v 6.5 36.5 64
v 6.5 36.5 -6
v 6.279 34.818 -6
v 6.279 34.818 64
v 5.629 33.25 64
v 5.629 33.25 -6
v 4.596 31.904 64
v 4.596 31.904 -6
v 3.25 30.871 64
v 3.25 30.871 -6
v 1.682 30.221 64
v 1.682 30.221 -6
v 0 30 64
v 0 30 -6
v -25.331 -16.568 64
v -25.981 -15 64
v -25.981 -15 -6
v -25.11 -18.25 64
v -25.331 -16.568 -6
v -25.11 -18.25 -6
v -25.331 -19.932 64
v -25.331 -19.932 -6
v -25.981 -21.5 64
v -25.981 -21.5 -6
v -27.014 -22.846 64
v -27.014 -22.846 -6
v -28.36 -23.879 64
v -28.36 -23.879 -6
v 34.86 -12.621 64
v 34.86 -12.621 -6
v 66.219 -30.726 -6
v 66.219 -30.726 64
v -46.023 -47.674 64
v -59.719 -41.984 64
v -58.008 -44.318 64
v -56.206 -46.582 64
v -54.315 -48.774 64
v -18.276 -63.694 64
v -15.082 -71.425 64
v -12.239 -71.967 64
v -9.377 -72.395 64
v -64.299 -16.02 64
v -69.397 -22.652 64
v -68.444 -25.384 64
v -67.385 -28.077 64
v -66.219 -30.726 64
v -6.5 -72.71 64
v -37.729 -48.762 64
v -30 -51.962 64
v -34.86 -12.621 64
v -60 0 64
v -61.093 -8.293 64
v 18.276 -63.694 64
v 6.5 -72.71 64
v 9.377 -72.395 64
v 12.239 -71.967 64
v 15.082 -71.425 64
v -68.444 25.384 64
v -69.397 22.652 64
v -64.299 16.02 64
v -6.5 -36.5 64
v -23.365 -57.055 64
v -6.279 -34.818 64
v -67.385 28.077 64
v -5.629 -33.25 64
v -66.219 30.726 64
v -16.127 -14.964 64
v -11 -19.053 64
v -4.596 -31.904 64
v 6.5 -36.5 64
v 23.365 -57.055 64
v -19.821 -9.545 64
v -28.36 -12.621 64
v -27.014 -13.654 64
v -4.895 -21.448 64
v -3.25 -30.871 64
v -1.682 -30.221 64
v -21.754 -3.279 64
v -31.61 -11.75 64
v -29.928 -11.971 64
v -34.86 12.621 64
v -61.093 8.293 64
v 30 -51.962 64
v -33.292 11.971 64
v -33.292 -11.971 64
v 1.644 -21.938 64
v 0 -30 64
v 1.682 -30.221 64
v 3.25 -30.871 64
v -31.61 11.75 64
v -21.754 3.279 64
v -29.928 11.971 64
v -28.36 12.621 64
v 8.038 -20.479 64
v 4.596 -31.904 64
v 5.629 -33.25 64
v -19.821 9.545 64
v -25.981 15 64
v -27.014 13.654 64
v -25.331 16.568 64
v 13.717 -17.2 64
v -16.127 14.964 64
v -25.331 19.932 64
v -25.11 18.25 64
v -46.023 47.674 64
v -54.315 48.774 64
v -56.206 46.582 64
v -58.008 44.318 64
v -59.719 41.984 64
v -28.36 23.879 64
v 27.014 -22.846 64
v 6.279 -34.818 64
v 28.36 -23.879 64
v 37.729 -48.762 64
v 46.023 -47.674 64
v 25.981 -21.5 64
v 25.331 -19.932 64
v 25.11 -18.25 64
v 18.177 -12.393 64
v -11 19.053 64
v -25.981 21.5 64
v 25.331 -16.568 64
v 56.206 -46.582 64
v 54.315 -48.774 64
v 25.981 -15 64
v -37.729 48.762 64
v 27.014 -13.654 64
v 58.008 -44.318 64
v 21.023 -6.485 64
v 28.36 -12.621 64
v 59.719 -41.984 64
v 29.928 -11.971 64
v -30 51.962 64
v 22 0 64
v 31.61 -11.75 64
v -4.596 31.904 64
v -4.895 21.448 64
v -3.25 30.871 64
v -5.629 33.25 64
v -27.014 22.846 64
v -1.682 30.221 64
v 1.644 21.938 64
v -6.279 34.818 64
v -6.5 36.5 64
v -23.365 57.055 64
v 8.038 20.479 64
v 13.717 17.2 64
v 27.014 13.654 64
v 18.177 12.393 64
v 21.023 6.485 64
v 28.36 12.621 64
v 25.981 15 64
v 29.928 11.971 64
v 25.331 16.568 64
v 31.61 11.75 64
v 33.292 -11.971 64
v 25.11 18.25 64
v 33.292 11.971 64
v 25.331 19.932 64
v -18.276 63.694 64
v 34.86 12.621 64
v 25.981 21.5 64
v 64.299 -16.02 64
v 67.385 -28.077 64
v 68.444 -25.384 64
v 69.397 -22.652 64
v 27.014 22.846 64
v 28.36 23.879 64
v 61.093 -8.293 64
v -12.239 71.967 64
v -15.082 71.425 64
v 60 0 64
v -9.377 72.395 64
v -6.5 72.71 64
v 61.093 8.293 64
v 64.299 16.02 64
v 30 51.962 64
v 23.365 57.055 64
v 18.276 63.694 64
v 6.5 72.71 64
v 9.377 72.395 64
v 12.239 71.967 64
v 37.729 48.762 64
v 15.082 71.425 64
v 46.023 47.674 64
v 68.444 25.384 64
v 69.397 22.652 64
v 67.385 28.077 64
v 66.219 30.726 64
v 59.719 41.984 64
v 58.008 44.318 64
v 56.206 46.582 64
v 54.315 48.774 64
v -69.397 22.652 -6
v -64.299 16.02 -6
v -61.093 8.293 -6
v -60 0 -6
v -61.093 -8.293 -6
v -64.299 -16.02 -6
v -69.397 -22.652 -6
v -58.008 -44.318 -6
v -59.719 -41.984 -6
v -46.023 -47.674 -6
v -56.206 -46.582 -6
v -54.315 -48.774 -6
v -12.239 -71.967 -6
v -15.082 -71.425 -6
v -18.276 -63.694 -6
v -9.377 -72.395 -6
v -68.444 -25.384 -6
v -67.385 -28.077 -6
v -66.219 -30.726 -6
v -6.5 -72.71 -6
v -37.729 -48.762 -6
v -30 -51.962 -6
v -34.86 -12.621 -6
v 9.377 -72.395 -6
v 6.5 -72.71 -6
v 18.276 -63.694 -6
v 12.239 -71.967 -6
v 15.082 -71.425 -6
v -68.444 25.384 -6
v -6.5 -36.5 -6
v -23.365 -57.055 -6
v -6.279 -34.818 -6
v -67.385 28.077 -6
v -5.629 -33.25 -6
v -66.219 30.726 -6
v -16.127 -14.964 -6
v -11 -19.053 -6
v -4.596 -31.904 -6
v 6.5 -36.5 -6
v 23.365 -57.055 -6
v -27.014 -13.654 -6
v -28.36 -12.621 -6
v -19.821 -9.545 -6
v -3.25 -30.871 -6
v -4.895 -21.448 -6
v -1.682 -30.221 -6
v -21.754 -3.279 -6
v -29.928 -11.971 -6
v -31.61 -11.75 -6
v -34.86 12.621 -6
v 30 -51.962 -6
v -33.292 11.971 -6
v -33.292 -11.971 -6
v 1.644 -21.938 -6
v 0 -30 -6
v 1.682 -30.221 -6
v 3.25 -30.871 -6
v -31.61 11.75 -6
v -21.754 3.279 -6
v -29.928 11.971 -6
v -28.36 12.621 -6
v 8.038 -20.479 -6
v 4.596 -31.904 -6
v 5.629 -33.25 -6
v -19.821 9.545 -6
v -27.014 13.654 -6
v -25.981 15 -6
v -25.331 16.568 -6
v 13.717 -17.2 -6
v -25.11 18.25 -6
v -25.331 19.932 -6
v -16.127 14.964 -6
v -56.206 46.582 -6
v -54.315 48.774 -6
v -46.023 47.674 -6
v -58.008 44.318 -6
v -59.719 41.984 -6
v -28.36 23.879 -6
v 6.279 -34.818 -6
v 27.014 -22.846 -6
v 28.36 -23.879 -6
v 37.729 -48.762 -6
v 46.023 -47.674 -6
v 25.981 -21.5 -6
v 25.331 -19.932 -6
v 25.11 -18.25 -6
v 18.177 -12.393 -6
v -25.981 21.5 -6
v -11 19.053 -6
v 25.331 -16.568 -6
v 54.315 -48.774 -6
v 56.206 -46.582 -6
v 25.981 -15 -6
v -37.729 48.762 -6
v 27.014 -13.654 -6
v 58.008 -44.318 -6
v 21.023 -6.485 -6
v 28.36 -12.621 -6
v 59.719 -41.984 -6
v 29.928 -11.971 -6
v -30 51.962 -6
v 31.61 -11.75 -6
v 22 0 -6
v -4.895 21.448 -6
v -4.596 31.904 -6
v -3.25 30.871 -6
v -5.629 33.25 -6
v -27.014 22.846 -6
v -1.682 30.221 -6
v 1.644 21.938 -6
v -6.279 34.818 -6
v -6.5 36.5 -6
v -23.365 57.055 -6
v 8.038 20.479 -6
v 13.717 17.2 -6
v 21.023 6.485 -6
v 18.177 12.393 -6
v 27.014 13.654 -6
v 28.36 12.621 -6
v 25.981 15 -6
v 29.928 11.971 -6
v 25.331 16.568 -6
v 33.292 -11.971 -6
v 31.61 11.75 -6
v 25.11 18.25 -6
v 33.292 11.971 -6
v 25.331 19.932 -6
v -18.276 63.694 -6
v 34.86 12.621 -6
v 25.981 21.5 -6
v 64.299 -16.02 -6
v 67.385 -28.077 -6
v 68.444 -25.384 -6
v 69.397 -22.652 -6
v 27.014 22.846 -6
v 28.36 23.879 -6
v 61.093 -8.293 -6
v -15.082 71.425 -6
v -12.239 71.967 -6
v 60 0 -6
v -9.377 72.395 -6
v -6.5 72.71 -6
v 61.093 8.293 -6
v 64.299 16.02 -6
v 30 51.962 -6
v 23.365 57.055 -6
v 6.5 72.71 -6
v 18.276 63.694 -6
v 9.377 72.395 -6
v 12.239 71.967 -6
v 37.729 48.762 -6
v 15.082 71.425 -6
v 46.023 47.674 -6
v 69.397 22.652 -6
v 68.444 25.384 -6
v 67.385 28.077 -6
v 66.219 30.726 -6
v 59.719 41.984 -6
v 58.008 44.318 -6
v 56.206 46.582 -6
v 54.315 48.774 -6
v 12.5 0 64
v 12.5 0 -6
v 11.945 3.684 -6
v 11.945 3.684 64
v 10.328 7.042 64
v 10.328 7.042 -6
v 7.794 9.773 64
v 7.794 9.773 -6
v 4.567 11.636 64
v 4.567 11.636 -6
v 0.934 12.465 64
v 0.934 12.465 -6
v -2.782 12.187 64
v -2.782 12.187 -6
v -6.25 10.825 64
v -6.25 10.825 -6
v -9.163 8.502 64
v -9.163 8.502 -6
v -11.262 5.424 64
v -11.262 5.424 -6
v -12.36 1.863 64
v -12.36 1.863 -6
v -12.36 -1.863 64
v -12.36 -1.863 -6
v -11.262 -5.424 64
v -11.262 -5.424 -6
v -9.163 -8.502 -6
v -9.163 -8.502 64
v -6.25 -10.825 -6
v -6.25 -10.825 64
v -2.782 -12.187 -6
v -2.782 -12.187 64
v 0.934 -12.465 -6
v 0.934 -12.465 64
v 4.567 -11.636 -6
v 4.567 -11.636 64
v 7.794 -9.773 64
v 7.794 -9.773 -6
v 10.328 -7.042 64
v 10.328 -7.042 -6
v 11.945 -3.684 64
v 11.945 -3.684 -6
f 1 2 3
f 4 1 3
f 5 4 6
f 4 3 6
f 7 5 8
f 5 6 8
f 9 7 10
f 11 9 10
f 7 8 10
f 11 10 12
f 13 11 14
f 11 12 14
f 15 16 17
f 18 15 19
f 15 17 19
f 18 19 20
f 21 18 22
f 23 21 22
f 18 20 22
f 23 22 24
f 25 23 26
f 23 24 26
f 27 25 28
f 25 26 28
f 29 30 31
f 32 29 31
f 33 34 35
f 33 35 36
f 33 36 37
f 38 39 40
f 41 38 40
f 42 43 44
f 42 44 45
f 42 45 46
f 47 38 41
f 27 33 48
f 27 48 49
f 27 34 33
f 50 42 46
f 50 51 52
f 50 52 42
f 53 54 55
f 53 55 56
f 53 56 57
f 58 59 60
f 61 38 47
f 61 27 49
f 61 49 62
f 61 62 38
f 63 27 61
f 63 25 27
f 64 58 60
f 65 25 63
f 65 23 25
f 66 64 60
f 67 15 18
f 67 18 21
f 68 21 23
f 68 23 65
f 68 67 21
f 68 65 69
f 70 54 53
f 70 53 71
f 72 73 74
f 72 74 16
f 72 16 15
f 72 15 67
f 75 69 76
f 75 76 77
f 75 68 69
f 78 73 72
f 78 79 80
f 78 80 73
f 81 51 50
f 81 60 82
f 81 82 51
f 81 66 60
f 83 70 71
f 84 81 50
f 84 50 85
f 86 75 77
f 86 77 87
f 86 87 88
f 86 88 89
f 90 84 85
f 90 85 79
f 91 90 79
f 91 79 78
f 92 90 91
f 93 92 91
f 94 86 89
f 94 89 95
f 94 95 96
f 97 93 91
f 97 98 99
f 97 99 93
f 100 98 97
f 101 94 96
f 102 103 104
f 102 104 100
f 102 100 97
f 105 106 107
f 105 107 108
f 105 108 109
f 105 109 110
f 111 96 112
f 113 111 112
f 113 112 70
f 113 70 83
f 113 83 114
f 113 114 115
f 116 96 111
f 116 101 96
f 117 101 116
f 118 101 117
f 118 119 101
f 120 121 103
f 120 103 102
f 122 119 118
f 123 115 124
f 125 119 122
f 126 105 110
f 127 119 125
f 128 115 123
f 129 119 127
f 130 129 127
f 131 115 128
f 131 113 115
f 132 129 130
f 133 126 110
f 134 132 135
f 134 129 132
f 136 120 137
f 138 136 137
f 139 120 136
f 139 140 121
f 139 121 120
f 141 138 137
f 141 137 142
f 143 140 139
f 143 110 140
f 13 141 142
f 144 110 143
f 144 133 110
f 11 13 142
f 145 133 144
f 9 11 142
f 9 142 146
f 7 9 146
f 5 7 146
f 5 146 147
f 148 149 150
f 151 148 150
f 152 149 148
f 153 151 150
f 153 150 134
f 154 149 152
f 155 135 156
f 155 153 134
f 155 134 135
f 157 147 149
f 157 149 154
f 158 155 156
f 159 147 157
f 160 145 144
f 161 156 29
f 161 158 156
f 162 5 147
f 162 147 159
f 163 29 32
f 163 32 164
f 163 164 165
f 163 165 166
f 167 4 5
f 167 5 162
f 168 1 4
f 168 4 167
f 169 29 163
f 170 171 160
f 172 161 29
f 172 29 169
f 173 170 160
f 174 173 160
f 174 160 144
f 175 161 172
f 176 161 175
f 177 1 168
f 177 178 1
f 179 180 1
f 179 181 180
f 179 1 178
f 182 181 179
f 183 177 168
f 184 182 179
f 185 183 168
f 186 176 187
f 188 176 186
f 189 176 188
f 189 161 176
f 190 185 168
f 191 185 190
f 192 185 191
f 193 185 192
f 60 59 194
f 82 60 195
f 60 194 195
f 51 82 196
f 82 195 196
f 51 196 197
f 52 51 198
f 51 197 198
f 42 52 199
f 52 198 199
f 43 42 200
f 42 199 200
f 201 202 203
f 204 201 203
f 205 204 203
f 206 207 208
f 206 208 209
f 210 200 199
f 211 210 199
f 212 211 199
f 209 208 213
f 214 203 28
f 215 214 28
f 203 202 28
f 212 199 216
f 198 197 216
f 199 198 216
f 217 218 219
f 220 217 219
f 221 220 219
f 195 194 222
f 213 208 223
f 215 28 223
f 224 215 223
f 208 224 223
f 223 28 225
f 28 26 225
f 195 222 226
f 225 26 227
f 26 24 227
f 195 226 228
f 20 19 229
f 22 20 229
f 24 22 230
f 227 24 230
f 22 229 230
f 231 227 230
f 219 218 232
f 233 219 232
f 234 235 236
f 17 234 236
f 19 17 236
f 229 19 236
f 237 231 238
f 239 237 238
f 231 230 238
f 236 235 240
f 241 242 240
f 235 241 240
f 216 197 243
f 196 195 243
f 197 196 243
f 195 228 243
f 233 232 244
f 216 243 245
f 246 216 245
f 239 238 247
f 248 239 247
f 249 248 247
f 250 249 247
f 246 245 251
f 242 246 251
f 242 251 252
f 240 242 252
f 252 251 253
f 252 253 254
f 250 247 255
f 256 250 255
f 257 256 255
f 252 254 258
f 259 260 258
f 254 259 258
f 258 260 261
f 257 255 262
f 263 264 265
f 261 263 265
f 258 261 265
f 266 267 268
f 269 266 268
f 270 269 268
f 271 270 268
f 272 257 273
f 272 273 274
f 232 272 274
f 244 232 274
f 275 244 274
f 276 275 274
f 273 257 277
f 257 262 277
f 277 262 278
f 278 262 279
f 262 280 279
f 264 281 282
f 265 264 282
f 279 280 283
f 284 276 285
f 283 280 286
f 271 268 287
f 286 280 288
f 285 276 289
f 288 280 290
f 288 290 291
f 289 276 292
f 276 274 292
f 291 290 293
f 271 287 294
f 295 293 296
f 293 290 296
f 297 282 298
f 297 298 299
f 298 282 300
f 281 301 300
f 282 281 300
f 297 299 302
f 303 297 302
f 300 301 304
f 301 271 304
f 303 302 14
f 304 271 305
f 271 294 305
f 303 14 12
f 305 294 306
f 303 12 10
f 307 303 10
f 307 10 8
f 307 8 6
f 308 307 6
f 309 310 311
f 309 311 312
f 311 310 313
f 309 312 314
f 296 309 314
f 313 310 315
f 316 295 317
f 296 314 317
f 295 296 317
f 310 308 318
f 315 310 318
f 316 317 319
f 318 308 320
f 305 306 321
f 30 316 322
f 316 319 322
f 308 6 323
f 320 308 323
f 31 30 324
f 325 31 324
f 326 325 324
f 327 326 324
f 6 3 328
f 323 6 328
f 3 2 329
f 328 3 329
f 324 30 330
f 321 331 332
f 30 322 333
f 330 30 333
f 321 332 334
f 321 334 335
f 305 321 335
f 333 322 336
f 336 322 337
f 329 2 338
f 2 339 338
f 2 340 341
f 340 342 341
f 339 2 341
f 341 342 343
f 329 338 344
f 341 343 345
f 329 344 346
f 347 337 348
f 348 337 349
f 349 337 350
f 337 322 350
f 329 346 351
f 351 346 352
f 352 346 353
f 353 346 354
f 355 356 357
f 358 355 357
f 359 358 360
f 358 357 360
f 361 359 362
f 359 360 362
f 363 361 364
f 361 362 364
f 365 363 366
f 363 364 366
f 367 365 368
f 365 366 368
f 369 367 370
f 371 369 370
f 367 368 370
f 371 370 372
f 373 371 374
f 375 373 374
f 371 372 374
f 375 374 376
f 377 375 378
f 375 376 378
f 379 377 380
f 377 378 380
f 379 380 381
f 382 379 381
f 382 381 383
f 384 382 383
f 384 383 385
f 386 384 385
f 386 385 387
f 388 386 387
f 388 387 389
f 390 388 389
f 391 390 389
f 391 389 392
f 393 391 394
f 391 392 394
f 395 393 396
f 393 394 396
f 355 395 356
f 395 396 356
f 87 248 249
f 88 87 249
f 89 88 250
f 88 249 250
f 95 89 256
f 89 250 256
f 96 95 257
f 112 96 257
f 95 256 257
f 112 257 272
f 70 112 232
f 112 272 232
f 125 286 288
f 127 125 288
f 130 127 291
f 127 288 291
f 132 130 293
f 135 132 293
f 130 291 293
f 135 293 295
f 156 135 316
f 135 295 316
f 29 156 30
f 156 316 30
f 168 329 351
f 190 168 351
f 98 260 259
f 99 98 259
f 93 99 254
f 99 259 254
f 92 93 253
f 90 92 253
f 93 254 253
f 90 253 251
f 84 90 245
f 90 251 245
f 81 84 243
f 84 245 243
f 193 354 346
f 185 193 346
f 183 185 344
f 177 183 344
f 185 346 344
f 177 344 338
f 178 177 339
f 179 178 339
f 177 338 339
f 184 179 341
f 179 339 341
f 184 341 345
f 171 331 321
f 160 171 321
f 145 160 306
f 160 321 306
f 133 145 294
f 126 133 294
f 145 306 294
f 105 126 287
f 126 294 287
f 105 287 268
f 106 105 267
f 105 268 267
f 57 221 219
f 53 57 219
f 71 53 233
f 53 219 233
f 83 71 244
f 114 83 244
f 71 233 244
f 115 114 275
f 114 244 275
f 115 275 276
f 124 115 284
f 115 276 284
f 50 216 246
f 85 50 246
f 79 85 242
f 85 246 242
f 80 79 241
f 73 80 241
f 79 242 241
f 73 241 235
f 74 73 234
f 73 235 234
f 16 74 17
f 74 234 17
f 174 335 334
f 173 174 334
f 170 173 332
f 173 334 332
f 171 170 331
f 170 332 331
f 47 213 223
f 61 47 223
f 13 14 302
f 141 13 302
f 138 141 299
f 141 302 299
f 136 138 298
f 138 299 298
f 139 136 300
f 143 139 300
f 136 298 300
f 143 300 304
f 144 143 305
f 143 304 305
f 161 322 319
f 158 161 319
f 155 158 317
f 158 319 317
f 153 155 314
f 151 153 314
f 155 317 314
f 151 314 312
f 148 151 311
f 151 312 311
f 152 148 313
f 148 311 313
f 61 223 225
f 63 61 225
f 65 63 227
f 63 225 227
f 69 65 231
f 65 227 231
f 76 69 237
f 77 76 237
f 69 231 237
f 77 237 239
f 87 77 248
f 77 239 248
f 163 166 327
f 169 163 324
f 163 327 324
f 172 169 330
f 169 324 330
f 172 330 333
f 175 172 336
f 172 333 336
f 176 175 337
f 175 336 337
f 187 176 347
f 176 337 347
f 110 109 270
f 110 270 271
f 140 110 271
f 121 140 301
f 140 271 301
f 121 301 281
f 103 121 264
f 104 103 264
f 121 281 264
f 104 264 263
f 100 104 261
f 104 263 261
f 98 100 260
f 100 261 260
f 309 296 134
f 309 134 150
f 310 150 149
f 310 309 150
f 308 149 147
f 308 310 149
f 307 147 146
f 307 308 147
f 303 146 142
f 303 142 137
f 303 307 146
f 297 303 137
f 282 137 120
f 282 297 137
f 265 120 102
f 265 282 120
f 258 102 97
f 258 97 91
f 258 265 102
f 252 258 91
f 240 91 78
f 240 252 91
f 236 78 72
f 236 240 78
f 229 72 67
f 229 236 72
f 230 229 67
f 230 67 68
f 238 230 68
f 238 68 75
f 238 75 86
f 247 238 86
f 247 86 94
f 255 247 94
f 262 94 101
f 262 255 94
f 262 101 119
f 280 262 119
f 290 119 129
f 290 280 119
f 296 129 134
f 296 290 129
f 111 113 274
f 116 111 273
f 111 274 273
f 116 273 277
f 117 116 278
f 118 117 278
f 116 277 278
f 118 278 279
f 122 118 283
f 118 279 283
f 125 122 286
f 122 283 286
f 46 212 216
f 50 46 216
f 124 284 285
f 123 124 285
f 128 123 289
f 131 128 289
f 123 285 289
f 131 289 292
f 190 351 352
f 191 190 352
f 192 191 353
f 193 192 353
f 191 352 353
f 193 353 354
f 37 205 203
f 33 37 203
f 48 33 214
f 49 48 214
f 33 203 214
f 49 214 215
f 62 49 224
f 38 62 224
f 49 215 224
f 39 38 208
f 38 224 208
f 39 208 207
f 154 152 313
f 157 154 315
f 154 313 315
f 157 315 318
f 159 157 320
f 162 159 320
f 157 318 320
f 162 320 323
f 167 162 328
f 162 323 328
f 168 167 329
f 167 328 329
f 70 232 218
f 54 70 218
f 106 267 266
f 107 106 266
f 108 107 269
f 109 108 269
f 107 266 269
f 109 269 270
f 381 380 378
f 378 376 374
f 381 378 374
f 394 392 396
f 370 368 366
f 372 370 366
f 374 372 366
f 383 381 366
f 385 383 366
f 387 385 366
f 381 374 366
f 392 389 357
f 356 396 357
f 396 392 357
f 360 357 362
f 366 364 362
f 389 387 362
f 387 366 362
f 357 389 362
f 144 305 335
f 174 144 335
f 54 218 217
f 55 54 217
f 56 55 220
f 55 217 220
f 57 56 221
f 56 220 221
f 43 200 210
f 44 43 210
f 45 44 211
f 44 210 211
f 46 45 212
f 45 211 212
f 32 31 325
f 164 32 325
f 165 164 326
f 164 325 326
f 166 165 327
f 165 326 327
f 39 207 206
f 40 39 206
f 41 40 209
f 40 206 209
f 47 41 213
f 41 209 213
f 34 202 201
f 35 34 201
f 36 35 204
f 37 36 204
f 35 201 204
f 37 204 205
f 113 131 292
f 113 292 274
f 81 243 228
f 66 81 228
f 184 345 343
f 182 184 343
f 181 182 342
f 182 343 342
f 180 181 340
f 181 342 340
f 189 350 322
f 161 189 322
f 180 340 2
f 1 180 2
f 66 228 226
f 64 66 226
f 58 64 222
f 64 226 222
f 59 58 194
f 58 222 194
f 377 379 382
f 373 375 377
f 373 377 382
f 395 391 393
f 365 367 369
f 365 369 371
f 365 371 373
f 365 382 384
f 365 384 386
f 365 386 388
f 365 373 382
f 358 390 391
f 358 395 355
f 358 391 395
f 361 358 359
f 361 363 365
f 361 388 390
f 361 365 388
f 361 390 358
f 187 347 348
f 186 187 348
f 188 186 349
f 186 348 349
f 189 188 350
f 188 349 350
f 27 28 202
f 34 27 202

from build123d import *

# Parameters (mm, degrees)
RESSALTO_EXTRUS_O1_DEPTH        = 64
RESSALTO_EXTRUS_O1_DEPTH_BACK   = 6
ESBO_O1_R                       = 22
RESSALTO_EXTRUS_O1_2_DEPTH      = 64
RESSALTO_EXTRUS_O1_2_DEPTH_BACK = 6
ESBO_O1_R_2                     = 12.5


with BuildPart() as part:
    # Esboço1 → Ressalto-extrusão1 (new, two sides: drawn at the far end of the back side and taken through both)
    with BuildSketch(Plane.XY.offset(-RESSALTO_EXTRUS_O1_DEPTH_BACK)):
        with BuildLine():
            Line((6.5, 72.710040572), (6.5, 36.5))
            ThreePointArc((6.5, 36.5), (4.596194078, 31.903805922), (0, 30))
            ThreePointArc((0, 30), (-4.596194078, 31.903805922), (-6.5, 36.5))
            Line((-6.5, 36.5), (-6.5, 72.710040572))
            ThreePointArc((-6.5, 72.710040572), (-10.809885724, 72.195196313), (-15.081554111, 71.42511271))
            ThreePointArc((-15.081554111, 71.42511271), (-30, 51.961524227), (-54.315185019, 48.773565344))
            ThreePointArc((-54.315185019, 48.773565344), (-57.117931176, 45.459233805), (-59.718742246, 41.984185411))
            Line((-59.718742246, 41.984185411), (-28.359927238, 23.879165125))
            ThreePointArc((-28.359927238, 23.879165125), (-25.331409367, 19.932323793), (-25.980762114, 15))
            ThreePointArc((-25.980762114, 15), (-29.927603445, 11.971482129), (-34.859927238, 12.620834875))
            Line((-34.859927238, 12.620834875), (-66.218742246, 30.725855161))
            ThreePointArc((-66.218742246, 30.725855161), (-67.9278169, 26.735962507), (-69.39673913, 22.651547366))
            ThreePointArc((-69.39673913, 22.651547366), (-60, 0), (-69.39673913, -22.651547366))
            ThreePointArc((-69.39673913, -22.651547366), (-67.9278169, -26.735962507), (-66.218742246, -30.725855161))
            Line((-66.218742246, -30.725855161), (-34.859927238, -12.620834875))
            ThreePointArc((-34.859927238, -12.620834875), (-29.927603445, -11.971482129), (-25.980762114, -15))
            ThreePointArc((-25.980762114, -15), (-25.331409367, -19.932323793), (-28.359927238, -23.879165125))
            Line((-28.359927238, -23.879165125), (-59.718742246, -41.984185411))
            ThreePointArc((-59.718742246, -41.984185411), (-57.117931176, -45.459233805), (-54.315185019, -48.773565344))
            ThreePointArc((-54.315185019, -48.773565344), (-30, -51.961524227), (-15.081554111, -71.42511271))
            ThreePointArc((-15.081554111, -71.42511271), (-10.809885724, -72.195196313), (-6.5, -72.710040572))
            Line((-6.5, -72.710040572), (-6.5, -36.5))
            ThreePointArc((-6.5, -36.5), (-4.596194078, -31.903805922), (0, -30))
            ThreePointArc((0, -30), (4.596194078, -31.903805922), (6.5, -36.5))
            Line((6.5, -36.5), (6.5, -72.710040572))
            ThreePointArc((6.5, -72.710040572), (10.809885724, -72.195196313), (15.081554111, -71.42511271))
            ThreePointArc((15.081554111, -71.42511271), (30, -51.961524227), (54.315185019, -48.773565344))
            ThreePointArc((54.315185019, -48.773565344), (57.117931176, -45.459233805), (59.718742246, -41.984185411))
            Line((59.718742246, -41.984185411), (28.359927238, -23.879165125))
            ThreePointArc((28.359927238, -23.879165125), (25.331409367, -19.932323793), (25.980762114, -15))
            ThreePointArc((25.980762114, -15), (29.927603445, -11.971482129), (34.859927238, -12.620834875))
            Line((34.859927238, -12.620834875), (66.218742246, -30.725855161))
            ThreePointArc((66.218742246, -30.725855161), (67.9278169, -26.735962507), (69.39673913, -22.651547366))
            ThreePointArc((69.39673913, -22.651547366), (60, 0), (69.39673913, 22.651547366))
            ThreePointArc((69.39673913, 22.651547366), (67.9278169, 26.735962507), (66.218742246, 30.725855161))
            Line((66.218742246, 30.725855161), (34.859927238, 12.620834875))
            ThreePointArc((34.859927238, 12.620834875), (29.927603445, 11.971482129), (25.980762114, 15))
            ThreePointArc((25.980762114, 15), (25.331409367, 19.932323793), (28.359927238, 23.879165125))
            Line((28.359927238, 23.879165125), (59.718742246, 41.984185411))
            ThreePointArc((59.718742246, 41.984185411), (57.117931176, 45.459233805), (54.315185019, 48.773565344))
            ThreePointArc((54.315185019, 48.773565344), (30, 51.961524227), (15.081554111, 71.42511271))
            ThreePointArc((15.081554111, 71.42511271), (10.809885724, 72.195196313), (6.5, 72.710040572))
        make_face()
        Circle(ESBO_O1_R, mode=Mode.SUBTRACT)
    extrude(amount=RESSALTO_EXTRUS_O1_DEPTH + RESSALTO_EXTRUS_O1_DEPTH_BACK)


with BuildPart() as body_2:
    # Esboço1 → Ressalto-extrus_o1 2 (new, two sides: drawn at the far end of the back side and taken through both)
    with BuildSketch(Plane.XY.offset(-RESSALTO_EXTRUS_O1_2_DEPTH_BACK)):
        Circle(ESBO_O1_R_2)
    extrude(amount=RESSALTO_EXTRUS_O1_2_DEPTH + RESSALTO_EXTRUS_O1_2_DEPTH_BACK)


solid = Compound([part.part, body_2.part])
